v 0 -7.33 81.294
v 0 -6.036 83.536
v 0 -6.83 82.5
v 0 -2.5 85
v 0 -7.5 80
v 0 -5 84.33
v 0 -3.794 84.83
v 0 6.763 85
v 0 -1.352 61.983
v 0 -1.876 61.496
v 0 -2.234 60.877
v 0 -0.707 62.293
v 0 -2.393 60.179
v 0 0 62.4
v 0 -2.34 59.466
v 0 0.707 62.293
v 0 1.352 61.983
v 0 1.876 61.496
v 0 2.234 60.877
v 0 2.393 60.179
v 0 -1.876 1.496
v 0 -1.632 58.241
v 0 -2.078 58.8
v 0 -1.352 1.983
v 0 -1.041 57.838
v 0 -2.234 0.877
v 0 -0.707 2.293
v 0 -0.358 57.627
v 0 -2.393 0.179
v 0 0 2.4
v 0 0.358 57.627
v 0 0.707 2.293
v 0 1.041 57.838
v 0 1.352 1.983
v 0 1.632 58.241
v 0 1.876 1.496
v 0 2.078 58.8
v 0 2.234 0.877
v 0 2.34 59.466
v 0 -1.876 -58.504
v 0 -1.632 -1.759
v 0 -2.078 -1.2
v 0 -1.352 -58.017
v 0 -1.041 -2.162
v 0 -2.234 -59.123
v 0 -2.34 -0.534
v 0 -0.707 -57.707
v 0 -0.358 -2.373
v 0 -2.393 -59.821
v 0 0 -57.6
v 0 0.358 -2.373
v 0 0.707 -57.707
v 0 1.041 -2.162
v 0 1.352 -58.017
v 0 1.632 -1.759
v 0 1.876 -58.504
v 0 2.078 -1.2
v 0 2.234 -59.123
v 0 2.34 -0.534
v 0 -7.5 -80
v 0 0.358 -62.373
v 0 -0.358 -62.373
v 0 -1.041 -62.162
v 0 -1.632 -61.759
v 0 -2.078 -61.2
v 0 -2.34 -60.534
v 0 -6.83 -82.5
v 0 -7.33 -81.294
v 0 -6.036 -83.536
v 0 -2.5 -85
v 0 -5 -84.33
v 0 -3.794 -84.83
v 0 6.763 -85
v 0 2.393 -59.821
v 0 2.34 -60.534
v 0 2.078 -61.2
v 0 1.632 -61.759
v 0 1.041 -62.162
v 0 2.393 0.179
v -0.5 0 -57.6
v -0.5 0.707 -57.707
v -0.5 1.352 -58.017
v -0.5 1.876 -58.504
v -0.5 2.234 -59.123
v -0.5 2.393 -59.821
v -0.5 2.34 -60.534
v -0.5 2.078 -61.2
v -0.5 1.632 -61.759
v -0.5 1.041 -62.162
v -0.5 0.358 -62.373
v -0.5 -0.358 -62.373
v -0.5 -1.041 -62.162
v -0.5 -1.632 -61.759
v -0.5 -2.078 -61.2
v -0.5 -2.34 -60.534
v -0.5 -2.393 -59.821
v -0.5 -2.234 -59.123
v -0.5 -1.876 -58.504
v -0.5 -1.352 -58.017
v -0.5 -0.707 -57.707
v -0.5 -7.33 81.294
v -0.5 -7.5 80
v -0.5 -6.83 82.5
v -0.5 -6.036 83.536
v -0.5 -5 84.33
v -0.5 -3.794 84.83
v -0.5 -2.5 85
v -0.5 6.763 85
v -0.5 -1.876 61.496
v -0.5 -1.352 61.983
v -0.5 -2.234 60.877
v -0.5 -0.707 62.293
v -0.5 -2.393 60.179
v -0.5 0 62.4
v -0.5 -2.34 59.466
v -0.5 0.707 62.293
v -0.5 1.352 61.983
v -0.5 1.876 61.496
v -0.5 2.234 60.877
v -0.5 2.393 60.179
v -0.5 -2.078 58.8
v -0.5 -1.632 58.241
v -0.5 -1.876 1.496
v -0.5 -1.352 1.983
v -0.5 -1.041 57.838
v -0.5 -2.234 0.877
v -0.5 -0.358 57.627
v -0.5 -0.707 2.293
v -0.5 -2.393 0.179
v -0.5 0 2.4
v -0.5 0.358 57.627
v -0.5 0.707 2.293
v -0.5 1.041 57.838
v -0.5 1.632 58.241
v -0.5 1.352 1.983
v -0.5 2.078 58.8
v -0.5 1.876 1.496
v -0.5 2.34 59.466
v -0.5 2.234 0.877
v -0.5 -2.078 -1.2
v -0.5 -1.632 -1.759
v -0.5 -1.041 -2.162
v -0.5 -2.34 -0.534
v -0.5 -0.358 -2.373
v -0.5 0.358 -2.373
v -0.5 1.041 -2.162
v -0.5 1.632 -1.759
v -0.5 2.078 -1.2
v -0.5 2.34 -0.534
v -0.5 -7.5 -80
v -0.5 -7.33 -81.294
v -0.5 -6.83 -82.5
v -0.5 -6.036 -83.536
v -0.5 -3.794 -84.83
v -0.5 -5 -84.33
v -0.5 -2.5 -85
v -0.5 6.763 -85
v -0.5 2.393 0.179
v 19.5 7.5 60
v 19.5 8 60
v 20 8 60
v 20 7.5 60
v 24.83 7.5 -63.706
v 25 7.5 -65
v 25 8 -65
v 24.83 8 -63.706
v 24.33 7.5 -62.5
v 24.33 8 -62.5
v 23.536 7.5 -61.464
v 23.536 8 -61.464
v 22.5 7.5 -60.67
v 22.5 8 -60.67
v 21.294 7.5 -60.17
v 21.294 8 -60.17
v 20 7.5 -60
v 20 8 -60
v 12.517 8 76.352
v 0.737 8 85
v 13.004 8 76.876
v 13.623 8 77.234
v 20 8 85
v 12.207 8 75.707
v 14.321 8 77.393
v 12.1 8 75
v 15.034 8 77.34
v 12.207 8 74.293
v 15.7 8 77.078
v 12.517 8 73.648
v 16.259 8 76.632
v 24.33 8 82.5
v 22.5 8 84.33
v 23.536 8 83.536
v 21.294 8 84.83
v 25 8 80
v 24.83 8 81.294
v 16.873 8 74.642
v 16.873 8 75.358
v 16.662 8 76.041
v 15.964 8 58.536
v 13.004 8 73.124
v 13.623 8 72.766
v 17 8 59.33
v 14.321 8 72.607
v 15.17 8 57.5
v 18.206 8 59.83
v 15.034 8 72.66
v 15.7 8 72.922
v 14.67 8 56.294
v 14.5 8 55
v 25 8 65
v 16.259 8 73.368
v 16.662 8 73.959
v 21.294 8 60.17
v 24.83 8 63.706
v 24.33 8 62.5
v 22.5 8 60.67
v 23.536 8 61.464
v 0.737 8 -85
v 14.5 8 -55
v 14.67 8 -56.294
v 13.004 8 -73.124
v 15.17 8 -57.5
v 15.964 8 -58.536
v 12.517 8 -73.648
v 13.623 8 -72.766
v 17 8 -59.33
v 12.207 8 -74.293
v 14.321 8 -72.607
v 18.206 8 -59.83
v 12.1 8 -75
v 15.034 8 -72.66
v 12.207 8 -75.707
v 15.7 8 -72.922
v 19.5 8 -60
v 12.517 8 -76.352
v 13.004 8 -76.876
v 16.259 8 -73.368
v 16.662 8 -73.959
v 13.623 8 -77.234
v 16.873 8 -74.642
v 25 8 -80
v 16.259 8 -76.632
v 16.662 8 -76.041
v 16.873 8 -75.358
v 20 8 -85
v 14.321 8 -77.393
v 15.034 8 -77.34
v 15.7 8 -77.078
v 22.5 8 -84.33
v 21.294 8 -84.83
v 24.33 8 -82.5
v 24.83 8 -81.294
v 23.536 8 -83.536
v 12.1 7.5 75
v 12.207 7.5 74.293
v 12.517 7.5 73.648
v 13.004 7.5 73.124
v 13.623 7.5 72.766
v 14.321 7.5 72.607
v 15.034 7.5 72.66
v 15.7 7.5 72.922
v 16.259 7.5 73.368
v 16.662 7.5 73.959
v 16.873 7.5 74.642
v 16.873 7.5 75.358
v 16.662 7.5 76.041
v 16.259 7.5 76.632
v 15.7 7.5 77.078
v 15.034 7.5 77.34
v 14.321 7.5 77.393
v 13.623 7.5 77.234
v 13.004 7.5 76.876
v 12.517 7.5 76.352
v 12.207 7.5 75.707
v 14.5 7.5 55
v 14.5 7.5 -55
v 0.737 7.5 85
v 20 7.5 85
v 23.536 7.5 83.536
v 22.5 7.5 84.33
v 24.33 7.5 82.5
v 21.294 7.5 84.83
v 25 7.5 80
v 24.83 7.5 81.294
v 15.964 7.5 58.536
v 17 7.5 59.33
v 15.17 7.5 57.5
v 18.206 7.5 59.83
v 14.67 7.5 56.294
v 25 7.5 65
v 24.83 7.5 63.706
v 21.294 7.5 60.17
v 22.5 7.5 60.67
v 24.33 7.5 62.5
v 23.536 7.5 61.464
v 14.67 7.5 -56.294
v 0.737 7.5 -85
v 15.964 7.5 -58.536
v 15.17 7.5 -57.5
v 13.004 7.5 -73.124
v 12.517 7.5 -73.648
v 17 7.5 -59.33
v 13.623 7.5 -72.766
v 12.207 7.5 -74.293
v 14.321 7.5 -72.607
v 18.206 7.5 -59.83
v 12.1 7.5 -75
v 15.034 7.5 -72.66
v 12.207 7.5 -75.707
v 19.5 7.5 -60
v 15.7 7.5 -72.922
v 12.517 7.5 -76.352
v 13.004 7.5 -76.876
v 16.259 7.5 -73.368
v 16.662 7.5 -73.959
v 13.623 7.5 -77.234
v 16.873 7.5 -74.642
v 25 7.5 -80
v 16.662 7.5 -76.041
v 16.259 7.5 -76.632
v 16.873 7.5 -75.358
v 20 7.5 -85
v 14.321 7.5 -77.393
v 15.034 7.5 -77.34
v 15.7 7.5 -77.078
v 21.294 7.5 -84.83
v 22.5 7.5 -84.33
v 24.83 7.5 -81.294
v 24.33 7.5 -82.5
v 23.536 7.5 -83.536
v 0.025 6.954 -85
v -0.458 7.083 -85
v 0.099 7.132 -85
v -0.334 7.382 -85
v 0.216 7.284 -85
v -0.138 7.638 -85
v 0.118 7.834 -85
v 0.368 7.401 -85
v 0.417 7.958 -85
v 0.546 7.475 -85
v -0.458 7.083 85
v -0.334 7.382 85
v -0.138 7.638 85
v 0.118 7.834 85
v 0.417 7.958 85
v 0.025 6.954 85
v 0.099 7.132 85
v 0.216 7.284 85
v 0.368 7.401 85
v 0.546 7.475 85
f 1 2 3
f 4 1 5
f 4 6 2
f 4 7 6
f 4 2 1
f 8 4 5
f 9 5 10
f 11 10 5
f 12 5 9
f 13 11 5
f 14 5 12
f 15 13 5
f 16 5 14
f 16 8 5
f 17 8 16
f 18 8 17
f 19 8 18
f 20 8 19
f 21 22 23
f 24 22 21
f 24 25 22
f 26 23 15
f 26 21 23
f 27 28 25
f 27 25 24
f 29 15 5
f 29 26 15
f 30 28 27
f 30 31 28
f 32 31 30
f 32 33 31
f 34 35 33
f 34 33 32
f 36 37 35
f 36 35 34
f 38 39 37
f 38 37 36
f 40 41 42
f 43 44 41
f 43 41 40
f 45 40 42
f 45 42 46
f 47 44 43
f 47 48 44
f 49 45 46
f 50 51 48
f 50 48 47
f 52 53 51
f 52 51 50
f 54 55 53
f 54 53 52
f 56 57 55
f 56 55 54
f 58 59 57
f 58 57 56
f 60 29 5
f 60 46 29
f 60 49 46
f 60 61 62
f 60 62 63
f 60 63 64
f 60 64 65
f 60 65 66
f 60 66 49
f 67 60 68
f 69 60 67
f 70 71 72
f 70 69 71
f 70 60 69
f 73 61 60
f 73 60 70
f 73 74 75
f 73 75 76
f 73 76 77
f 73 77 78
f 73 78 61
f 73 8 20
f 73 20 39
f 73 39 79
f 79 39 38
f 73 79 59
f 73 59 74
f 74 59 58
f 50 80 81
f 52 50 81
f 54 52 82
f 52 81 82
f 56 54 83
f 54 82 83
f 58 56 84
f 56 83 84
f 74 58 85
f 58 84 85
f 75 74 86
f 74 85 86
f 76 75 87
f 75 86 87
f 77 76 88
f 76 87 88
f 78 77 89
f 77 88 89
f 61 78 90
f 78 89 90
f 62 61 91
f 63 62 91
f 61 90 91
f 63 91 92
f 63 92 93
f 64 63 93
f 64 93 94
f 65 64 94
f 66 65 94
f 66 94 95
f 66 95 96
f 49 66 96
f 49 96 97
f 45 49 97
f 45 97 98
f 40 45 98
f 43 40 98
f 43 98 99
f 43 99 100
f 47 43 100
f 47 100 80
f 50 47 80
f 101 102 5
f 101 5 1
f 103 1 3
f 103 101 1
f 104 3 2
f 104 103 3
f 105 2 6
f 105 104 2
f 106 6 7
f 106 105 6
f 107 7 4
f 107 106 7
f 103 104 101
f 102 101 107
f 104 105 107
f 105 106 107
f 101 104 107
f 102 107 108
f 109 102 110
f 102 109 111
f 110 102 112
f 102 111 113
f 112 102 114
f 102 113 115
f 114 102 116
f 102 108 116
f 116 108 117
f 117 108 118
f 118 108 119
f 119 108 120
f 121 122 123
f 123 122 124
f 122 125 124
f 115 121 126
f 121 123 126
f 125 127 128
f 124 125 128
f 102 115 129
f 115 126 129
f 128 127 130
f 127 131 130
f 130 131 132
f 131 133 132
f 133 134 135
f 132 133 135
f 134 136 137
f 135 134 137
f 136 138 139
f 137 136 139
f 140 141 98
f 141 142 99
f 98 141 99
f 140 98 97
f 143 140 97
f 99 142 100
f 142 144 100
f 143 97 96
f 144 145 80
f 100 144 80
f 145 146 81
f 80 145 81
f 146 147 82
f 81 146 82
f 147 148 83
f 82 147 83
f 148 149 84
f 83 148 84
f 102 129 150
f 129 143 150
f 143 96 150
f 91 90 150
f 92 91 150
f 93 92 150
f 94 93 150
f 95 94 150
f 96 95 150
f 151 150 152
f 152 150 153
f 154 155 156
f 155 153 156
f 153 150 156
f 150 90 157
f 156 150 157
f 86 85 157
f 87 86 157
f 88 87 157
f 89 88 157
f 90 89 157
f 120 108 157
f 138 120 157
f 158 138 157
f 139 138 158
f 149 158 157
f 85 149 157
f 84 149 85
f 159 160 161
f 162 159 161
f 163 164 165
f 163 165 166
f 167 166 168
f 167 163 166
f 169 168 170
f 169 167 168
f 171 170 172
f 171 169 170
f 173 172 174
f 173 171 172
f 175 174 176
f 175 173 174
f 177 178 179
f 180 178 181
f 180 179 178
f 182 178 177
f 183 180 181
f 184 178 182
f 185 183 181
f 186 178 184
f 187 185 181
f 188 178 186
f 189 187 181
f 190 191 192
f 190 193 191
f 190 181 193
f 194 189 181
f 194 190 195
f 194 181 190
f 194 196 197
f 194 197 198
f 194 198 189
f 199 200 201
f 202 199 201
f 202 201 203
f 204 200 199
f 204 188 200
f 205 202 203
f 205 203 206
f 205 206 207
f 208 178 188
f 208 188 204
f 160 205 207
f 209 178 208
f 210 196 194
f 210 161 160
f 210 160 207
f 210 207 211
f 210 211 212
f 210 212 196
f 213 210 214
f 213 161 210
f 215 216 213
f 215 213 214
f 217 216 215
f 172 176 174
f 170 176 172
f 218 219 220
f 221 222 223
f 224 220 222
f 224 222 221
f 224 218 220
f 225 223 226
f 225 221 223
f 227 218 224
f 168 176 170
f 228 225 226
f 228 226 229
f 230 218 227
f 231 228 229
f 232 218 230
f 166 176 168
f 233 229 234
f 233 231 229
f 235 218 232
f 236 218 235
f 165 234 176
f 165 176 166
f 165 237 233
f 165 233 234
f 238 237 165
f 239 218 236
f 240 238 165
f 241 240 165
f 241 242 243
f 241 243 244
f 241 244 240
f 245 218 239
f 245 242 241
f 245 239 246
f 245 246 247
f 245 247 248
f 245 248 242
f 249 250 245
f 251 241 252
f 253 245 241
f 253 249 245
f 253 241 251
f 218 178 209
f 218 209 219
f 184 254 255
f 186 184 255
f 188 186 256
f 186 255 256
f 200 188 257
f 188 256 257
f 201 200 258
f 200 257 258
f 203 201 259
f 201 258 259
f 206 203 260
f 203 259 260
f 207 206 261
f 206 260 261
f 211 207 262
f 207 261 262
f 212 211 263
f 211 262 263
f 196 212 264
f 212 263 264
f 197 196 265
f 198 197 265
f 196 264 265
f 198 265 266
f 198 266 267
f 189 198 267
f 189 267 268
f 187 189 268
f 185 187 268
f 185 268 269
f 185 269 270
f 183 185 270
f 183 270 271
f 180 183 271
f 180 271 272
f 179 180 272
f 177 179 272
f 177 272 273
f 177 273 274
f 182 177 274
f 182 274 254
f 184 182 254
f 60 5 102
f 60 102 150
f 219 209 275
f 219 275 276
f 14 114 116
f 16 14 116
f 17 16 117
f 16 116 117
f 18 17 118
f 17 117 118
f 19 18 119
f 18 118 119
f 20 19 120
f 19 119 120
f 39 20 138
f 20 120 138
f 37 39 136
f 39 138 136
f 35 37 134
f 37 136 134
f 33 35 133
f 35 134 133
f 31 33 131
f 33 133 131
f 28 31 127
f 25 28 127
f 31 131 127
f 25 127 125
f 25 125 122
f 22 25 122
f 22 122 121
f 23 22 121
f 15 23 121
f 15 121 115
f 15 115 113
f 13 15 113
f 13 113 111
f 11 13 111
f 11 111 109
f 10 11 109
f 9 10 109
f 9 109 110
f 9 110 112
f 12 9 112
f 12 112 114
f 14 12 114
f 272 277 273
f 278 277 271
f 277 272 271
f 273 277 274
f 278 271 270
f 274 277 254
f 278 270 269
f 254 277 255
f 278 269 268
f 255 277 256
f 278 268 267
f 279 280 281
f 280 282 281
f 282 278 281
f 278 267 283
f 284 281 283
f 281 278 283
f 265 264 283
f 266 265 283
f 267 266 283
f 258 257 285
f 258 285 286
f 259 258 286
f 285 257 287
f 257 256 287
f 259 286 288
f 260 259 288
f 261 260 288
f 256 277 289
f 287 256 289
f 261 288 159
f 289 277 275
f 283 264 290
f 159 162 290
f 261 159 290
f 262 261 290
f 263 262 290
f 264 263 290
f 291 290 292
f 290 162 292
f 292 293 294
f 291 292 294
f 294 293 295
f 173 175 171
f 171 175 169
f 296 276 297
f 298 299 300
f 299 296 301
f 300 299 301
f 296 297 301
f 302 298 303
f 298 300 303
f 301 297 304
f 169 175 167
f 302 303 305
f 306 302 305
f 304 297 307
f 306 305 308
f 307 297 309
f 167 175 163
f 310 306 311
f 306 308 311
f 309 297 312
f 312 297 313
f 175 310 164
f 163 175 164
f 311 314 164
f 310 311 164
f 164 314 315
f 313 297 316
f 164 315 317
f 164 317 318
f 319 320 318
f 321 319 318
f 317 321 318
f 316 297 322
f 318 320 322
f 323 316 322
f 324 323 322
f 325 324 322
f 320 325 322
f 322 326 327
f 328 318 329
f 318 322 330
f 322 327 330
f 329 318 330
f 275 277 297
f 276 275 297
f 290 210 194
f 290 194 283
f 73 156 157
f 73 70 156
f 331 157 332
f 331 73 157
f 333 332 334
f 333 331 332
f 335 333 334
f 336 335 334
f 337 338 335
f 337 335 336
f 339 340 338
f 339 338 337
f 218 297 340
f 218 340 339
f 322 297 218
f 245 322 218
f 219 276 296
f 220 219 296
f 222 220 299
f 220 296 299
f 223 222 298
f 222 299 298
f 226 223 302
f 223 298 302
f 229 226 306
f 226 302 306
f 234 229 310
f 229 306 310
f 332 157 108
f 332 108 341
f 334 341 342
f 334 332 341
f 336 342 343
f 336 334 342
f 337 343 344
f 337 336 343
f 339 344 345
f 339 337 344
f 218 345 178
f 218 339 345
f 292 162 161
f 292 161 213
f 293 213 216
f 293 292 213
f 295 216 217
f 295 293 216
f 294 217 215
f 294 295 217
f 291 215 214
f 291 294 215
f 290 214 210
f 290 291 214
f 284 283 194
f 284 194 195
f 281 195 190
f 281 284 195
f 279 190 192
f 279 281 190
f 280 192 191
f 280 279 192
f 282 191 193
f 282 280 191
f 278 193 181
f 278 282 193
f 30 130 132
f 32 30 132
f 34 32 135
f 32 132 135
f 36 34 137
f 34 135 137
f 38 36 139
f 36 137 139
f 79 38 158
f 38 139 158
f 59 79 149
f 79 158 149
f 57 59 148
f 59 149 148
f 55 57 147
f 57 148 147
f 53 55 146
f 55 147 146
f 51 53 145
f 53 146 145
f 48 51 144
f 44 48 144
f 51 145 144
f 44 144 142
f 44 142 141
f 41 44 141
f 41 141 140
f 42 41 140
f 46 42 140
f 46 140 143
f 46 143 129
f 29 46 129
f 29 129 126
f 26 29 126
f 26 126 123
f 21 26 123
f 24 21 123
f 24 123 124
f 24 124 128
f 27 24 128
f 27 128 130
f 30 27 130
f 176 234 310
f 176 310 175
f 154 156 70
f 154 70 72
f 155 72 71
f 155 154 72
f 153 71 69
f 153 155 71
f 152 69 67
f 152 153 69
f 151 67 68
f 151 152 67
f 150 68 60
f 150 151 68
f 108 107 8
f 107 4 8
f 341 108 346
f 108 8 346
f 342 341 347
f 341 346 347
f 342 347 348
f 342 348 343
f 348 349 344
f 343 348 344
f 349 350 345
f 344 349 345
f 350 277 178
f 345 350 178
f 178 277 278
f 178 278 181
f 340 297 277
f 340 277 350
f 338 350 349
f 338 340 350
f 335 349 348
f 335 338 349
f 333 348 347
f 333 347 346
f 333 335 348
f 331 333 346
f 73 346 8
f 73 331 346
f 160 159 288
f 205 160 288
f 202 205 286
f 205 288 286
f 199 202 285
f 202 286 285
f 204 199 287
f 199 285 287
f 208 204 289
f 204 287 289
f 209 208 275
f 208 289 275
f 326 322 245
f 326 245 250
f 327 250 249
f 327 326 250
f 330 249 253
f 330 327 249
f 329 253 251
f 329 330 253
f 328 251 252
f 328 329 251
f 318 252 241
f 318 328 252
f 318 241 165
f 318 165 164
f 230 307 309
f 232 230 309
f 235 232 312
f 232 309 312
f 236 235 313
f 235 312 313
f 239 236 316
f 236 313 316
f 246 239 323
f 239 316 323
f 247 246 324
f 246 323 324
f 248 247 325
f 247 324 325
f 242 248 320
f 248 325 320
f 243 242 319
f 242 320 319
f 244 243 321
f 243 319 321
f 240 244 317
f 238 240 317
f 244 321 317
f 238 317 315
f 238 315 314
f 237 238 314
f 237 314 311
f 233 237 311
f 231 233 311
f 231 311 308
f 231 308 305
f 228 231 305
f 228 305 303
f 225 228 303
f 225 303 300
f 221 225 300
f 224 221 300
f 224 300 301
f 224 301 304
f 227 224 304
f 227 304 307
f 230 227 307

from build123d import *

# Parameters (mm, degrees)
SKETCH2_W                    = 170
SKETCH2_H                    = 15
BASE_FLANGE1_DEPTH           = 0.5
EDGE_FLANGE1_STRIP_W         = 3.4732
EDGE_FLANGE1_STRIP_H         = 0.5
EDGE_FLANGE1_STRIP_CUT_DEPTH = 170
EDGE_FLANGE1_DEPTH           = 170
M4_CLEARANCE_HOLE1_D         = 4.8
SKETCH14_W                   = 10.5
SKETCH14_H                   = 120
CUT_EXTRUDE1_DEPTH           = 90.945817023
BREAK_CORNER1_START          = 7.5
BREAK_CORNER1_DEPTH          = 0.5
BREAK_CORNER1_START_2        = -0.5
BREAK_CORNER1_2_DEPTH        = 0.5
BREAK_CORNER2_START          = 7.5
BREAK_CORNER2_DEPTH          = 0.5
M4_CLEARANCE_HOLE2_D         = 4.8


# Read off the part's stored shape, not the designer's step: Break-Corner1, Break-Corner2
# Sheet-metal steps are written as plain solids
with BuildPart() as part:
    # Sketch2 → Base-Flange1 (new body)
    with BuildSketch(Plane(origin=(0, 0, 0), x_dir=(0, 0, -1), z_dir=(1, 0, 0))):
        Rectangle(SKETCH2_W, SKETCH2_H)
    extrude(amount=-BASE_FLANGE1_DEPTH)

    # Edge-Flange1 strip (across the edge) → Edge-Flange1 strip cut (cut)
    with BuildSketch(Plane(origin=(0, 7.5, -85), x_dir=(0, -1, 0), z_dir=(0, 0, 1))):
        with Locations((-1, -0.25)):
            Rectangle(EDGE_FLANGE1_STRIP_W, EDGE_FLANGE1_STRIP_H)
    extrude(amount=EDGE_FLANGE1_STRIP_CUT_DEPTH, mode=Mode.SUBTRACT)

    # Edge-Flange1 section (across the edge) → Edge-Flange1 (add)
    with BuildSketch(Plane(origin=(0, 7.5, -85), x_dir=(0, -1, 0), z_dir=(0, 0, 1))):
        with BuildLine():
            Line((-0.5, 0.7366), (-0.5, 25))
            Line((-0.5, 25), (0, 25))
            Line((0, 25), (0, 0.7366))
            ThreePointArc((0, 0.7366), (0.215745145, 0.215745145), (0.7366, 0))
            Line((0.7366, 0), (0.7366, -0.5))
            ThreePointArc((0.7366, -0.5), (-0.137808246, -0.137808246), (-0.5, 0.7366))
        make_face()
    extrude(amount=EDGE_FLANGE1_DEPTH)

    # M4 Clearance Hole1 (through all)
    with Locations(Plane(origin=(0, 8, 0), x_dir=(1, 0, 0), z_dir=(0, 1, 0))):
        with Locations((14.5, 75), (14.5, -75)):
            Hole(M4_CLEARANCE_HOLE1_D / 2)

    # Sketch14 → Cut-Extrude1 (cut, through all)
    with BuildSketch(Plane(origin=(0, 8, 0), x_dir=(1, 0, 0), z_dir=(0, 1, 0))):
        with Locations((19.75, 0)):
            Rectangle(SKETCH14_W, SKETCH14_H)
    extrude(amount=-CUT_EXTRUDE1_DEPTH, mode=Mode.SUBTRACT)

    # Break-Corner1 outline → Break-Corner1 (cut)
    with BuildSketch(Plane(origin=(0, 0, 0), x_dir=(1, 0, 0), z_dir=(0, 1, 0)).offset(BREAK_CORNER1_START)):
        with BuildLine():
            Line((25, -85), (25, -80))
            ThreePointArc((25, -80), (23.535533906, -83.535533906), (20, -85))
            Line((20, -85), (25, -85))
        make_face()
        with BuildLine():
            ThreePointArc((20, -60), (23.535533906, -61.464466094), (25, -65))
            Line((25, -65), (25, -60))
            Line((25, -60), (20, -60))
        make_face()
        with BuildLine():
            Line((25, 85), (20, 85))
            ThreePointArc((20, 85), (23.535533906, 83.535533906), (25, 80))
            Line((25, 80), (25, 85))
        make_face()
        with BuildLine():
            Line((25, 60), (25, 65))
            ThreePointArc((25, 65), (23.535533906, 61.464466094), (20, 60))
            Line((20, 60), (25, 60))
        make_face()
    extrude(amount=BREAK_CORNER1_DEPTH, mode=Mode.SUBTRACT)

    # Break-Corner1 2 outline → Break-Corner1 2 (cut)
    with BuildSketch(Plane.YZ.offset(BREAK_CORNER1_START_2)):
        with BuildLine():
            Line((-7.5, 85), (-7.5, 80))
            ThreePointArc((-7.5, 80), (-6.035533906, 83.535533906), (-2.5, 85))
            Line((-2.5, 85), (-7.5, 85))
        make_face()
        with BuildLine():
            ThreePointArc((-2.5, -85), (-6.035533906, -83.535533906), (-7.5, -80))
            Line((-7.5, -80), (-7.5, -85))
            Line((-7.5, -85), (-2.5, -85))
        make_face()
    extrude(amount=BREAK_CORNER1_2_DEPTH, mode=Mode.SUBTRACT)

    # Break-Corner2 outline → Break-Corner2 (add)
    with BuildSketch(Plane(origin=(0, 0, 0), x_dir=(1, 0, 0), z_dir=(0, 1, 0)).offset(BREAK_CORNER2_START)):
        with BuildLine():
            Line((14.5, 60), (14.5, 55))
            ThreePointArc((14.5, 55), (15.964466094, 58.535533906), (19.5, 60))
            Line((19.5, 60), (14.5, 60))
        make_face()
        with BuildLine():
            ThreePointArc((19.5, -60), (15.964466094, -58.535533906), (14.5, -55))
            Line((14.5, -55), (14.5, -60))
            Line((14.5, -60), (19.5, -60))
        make_face()
    extrude(amount=BREAK_CORNER2_DEPTH)

    # M4 Clearance Hole2 (through all)
    with Locations(Plane(origin=(0, 0, 0), x_dir=(0, 0, -1), z_dir=(1, 0, 0))):
        with Locations((-60, 0), (0, 0), (60, 0)):
            Hole(M4_CLEARANCE_HOLE2_D / 2)


solid = part.part
